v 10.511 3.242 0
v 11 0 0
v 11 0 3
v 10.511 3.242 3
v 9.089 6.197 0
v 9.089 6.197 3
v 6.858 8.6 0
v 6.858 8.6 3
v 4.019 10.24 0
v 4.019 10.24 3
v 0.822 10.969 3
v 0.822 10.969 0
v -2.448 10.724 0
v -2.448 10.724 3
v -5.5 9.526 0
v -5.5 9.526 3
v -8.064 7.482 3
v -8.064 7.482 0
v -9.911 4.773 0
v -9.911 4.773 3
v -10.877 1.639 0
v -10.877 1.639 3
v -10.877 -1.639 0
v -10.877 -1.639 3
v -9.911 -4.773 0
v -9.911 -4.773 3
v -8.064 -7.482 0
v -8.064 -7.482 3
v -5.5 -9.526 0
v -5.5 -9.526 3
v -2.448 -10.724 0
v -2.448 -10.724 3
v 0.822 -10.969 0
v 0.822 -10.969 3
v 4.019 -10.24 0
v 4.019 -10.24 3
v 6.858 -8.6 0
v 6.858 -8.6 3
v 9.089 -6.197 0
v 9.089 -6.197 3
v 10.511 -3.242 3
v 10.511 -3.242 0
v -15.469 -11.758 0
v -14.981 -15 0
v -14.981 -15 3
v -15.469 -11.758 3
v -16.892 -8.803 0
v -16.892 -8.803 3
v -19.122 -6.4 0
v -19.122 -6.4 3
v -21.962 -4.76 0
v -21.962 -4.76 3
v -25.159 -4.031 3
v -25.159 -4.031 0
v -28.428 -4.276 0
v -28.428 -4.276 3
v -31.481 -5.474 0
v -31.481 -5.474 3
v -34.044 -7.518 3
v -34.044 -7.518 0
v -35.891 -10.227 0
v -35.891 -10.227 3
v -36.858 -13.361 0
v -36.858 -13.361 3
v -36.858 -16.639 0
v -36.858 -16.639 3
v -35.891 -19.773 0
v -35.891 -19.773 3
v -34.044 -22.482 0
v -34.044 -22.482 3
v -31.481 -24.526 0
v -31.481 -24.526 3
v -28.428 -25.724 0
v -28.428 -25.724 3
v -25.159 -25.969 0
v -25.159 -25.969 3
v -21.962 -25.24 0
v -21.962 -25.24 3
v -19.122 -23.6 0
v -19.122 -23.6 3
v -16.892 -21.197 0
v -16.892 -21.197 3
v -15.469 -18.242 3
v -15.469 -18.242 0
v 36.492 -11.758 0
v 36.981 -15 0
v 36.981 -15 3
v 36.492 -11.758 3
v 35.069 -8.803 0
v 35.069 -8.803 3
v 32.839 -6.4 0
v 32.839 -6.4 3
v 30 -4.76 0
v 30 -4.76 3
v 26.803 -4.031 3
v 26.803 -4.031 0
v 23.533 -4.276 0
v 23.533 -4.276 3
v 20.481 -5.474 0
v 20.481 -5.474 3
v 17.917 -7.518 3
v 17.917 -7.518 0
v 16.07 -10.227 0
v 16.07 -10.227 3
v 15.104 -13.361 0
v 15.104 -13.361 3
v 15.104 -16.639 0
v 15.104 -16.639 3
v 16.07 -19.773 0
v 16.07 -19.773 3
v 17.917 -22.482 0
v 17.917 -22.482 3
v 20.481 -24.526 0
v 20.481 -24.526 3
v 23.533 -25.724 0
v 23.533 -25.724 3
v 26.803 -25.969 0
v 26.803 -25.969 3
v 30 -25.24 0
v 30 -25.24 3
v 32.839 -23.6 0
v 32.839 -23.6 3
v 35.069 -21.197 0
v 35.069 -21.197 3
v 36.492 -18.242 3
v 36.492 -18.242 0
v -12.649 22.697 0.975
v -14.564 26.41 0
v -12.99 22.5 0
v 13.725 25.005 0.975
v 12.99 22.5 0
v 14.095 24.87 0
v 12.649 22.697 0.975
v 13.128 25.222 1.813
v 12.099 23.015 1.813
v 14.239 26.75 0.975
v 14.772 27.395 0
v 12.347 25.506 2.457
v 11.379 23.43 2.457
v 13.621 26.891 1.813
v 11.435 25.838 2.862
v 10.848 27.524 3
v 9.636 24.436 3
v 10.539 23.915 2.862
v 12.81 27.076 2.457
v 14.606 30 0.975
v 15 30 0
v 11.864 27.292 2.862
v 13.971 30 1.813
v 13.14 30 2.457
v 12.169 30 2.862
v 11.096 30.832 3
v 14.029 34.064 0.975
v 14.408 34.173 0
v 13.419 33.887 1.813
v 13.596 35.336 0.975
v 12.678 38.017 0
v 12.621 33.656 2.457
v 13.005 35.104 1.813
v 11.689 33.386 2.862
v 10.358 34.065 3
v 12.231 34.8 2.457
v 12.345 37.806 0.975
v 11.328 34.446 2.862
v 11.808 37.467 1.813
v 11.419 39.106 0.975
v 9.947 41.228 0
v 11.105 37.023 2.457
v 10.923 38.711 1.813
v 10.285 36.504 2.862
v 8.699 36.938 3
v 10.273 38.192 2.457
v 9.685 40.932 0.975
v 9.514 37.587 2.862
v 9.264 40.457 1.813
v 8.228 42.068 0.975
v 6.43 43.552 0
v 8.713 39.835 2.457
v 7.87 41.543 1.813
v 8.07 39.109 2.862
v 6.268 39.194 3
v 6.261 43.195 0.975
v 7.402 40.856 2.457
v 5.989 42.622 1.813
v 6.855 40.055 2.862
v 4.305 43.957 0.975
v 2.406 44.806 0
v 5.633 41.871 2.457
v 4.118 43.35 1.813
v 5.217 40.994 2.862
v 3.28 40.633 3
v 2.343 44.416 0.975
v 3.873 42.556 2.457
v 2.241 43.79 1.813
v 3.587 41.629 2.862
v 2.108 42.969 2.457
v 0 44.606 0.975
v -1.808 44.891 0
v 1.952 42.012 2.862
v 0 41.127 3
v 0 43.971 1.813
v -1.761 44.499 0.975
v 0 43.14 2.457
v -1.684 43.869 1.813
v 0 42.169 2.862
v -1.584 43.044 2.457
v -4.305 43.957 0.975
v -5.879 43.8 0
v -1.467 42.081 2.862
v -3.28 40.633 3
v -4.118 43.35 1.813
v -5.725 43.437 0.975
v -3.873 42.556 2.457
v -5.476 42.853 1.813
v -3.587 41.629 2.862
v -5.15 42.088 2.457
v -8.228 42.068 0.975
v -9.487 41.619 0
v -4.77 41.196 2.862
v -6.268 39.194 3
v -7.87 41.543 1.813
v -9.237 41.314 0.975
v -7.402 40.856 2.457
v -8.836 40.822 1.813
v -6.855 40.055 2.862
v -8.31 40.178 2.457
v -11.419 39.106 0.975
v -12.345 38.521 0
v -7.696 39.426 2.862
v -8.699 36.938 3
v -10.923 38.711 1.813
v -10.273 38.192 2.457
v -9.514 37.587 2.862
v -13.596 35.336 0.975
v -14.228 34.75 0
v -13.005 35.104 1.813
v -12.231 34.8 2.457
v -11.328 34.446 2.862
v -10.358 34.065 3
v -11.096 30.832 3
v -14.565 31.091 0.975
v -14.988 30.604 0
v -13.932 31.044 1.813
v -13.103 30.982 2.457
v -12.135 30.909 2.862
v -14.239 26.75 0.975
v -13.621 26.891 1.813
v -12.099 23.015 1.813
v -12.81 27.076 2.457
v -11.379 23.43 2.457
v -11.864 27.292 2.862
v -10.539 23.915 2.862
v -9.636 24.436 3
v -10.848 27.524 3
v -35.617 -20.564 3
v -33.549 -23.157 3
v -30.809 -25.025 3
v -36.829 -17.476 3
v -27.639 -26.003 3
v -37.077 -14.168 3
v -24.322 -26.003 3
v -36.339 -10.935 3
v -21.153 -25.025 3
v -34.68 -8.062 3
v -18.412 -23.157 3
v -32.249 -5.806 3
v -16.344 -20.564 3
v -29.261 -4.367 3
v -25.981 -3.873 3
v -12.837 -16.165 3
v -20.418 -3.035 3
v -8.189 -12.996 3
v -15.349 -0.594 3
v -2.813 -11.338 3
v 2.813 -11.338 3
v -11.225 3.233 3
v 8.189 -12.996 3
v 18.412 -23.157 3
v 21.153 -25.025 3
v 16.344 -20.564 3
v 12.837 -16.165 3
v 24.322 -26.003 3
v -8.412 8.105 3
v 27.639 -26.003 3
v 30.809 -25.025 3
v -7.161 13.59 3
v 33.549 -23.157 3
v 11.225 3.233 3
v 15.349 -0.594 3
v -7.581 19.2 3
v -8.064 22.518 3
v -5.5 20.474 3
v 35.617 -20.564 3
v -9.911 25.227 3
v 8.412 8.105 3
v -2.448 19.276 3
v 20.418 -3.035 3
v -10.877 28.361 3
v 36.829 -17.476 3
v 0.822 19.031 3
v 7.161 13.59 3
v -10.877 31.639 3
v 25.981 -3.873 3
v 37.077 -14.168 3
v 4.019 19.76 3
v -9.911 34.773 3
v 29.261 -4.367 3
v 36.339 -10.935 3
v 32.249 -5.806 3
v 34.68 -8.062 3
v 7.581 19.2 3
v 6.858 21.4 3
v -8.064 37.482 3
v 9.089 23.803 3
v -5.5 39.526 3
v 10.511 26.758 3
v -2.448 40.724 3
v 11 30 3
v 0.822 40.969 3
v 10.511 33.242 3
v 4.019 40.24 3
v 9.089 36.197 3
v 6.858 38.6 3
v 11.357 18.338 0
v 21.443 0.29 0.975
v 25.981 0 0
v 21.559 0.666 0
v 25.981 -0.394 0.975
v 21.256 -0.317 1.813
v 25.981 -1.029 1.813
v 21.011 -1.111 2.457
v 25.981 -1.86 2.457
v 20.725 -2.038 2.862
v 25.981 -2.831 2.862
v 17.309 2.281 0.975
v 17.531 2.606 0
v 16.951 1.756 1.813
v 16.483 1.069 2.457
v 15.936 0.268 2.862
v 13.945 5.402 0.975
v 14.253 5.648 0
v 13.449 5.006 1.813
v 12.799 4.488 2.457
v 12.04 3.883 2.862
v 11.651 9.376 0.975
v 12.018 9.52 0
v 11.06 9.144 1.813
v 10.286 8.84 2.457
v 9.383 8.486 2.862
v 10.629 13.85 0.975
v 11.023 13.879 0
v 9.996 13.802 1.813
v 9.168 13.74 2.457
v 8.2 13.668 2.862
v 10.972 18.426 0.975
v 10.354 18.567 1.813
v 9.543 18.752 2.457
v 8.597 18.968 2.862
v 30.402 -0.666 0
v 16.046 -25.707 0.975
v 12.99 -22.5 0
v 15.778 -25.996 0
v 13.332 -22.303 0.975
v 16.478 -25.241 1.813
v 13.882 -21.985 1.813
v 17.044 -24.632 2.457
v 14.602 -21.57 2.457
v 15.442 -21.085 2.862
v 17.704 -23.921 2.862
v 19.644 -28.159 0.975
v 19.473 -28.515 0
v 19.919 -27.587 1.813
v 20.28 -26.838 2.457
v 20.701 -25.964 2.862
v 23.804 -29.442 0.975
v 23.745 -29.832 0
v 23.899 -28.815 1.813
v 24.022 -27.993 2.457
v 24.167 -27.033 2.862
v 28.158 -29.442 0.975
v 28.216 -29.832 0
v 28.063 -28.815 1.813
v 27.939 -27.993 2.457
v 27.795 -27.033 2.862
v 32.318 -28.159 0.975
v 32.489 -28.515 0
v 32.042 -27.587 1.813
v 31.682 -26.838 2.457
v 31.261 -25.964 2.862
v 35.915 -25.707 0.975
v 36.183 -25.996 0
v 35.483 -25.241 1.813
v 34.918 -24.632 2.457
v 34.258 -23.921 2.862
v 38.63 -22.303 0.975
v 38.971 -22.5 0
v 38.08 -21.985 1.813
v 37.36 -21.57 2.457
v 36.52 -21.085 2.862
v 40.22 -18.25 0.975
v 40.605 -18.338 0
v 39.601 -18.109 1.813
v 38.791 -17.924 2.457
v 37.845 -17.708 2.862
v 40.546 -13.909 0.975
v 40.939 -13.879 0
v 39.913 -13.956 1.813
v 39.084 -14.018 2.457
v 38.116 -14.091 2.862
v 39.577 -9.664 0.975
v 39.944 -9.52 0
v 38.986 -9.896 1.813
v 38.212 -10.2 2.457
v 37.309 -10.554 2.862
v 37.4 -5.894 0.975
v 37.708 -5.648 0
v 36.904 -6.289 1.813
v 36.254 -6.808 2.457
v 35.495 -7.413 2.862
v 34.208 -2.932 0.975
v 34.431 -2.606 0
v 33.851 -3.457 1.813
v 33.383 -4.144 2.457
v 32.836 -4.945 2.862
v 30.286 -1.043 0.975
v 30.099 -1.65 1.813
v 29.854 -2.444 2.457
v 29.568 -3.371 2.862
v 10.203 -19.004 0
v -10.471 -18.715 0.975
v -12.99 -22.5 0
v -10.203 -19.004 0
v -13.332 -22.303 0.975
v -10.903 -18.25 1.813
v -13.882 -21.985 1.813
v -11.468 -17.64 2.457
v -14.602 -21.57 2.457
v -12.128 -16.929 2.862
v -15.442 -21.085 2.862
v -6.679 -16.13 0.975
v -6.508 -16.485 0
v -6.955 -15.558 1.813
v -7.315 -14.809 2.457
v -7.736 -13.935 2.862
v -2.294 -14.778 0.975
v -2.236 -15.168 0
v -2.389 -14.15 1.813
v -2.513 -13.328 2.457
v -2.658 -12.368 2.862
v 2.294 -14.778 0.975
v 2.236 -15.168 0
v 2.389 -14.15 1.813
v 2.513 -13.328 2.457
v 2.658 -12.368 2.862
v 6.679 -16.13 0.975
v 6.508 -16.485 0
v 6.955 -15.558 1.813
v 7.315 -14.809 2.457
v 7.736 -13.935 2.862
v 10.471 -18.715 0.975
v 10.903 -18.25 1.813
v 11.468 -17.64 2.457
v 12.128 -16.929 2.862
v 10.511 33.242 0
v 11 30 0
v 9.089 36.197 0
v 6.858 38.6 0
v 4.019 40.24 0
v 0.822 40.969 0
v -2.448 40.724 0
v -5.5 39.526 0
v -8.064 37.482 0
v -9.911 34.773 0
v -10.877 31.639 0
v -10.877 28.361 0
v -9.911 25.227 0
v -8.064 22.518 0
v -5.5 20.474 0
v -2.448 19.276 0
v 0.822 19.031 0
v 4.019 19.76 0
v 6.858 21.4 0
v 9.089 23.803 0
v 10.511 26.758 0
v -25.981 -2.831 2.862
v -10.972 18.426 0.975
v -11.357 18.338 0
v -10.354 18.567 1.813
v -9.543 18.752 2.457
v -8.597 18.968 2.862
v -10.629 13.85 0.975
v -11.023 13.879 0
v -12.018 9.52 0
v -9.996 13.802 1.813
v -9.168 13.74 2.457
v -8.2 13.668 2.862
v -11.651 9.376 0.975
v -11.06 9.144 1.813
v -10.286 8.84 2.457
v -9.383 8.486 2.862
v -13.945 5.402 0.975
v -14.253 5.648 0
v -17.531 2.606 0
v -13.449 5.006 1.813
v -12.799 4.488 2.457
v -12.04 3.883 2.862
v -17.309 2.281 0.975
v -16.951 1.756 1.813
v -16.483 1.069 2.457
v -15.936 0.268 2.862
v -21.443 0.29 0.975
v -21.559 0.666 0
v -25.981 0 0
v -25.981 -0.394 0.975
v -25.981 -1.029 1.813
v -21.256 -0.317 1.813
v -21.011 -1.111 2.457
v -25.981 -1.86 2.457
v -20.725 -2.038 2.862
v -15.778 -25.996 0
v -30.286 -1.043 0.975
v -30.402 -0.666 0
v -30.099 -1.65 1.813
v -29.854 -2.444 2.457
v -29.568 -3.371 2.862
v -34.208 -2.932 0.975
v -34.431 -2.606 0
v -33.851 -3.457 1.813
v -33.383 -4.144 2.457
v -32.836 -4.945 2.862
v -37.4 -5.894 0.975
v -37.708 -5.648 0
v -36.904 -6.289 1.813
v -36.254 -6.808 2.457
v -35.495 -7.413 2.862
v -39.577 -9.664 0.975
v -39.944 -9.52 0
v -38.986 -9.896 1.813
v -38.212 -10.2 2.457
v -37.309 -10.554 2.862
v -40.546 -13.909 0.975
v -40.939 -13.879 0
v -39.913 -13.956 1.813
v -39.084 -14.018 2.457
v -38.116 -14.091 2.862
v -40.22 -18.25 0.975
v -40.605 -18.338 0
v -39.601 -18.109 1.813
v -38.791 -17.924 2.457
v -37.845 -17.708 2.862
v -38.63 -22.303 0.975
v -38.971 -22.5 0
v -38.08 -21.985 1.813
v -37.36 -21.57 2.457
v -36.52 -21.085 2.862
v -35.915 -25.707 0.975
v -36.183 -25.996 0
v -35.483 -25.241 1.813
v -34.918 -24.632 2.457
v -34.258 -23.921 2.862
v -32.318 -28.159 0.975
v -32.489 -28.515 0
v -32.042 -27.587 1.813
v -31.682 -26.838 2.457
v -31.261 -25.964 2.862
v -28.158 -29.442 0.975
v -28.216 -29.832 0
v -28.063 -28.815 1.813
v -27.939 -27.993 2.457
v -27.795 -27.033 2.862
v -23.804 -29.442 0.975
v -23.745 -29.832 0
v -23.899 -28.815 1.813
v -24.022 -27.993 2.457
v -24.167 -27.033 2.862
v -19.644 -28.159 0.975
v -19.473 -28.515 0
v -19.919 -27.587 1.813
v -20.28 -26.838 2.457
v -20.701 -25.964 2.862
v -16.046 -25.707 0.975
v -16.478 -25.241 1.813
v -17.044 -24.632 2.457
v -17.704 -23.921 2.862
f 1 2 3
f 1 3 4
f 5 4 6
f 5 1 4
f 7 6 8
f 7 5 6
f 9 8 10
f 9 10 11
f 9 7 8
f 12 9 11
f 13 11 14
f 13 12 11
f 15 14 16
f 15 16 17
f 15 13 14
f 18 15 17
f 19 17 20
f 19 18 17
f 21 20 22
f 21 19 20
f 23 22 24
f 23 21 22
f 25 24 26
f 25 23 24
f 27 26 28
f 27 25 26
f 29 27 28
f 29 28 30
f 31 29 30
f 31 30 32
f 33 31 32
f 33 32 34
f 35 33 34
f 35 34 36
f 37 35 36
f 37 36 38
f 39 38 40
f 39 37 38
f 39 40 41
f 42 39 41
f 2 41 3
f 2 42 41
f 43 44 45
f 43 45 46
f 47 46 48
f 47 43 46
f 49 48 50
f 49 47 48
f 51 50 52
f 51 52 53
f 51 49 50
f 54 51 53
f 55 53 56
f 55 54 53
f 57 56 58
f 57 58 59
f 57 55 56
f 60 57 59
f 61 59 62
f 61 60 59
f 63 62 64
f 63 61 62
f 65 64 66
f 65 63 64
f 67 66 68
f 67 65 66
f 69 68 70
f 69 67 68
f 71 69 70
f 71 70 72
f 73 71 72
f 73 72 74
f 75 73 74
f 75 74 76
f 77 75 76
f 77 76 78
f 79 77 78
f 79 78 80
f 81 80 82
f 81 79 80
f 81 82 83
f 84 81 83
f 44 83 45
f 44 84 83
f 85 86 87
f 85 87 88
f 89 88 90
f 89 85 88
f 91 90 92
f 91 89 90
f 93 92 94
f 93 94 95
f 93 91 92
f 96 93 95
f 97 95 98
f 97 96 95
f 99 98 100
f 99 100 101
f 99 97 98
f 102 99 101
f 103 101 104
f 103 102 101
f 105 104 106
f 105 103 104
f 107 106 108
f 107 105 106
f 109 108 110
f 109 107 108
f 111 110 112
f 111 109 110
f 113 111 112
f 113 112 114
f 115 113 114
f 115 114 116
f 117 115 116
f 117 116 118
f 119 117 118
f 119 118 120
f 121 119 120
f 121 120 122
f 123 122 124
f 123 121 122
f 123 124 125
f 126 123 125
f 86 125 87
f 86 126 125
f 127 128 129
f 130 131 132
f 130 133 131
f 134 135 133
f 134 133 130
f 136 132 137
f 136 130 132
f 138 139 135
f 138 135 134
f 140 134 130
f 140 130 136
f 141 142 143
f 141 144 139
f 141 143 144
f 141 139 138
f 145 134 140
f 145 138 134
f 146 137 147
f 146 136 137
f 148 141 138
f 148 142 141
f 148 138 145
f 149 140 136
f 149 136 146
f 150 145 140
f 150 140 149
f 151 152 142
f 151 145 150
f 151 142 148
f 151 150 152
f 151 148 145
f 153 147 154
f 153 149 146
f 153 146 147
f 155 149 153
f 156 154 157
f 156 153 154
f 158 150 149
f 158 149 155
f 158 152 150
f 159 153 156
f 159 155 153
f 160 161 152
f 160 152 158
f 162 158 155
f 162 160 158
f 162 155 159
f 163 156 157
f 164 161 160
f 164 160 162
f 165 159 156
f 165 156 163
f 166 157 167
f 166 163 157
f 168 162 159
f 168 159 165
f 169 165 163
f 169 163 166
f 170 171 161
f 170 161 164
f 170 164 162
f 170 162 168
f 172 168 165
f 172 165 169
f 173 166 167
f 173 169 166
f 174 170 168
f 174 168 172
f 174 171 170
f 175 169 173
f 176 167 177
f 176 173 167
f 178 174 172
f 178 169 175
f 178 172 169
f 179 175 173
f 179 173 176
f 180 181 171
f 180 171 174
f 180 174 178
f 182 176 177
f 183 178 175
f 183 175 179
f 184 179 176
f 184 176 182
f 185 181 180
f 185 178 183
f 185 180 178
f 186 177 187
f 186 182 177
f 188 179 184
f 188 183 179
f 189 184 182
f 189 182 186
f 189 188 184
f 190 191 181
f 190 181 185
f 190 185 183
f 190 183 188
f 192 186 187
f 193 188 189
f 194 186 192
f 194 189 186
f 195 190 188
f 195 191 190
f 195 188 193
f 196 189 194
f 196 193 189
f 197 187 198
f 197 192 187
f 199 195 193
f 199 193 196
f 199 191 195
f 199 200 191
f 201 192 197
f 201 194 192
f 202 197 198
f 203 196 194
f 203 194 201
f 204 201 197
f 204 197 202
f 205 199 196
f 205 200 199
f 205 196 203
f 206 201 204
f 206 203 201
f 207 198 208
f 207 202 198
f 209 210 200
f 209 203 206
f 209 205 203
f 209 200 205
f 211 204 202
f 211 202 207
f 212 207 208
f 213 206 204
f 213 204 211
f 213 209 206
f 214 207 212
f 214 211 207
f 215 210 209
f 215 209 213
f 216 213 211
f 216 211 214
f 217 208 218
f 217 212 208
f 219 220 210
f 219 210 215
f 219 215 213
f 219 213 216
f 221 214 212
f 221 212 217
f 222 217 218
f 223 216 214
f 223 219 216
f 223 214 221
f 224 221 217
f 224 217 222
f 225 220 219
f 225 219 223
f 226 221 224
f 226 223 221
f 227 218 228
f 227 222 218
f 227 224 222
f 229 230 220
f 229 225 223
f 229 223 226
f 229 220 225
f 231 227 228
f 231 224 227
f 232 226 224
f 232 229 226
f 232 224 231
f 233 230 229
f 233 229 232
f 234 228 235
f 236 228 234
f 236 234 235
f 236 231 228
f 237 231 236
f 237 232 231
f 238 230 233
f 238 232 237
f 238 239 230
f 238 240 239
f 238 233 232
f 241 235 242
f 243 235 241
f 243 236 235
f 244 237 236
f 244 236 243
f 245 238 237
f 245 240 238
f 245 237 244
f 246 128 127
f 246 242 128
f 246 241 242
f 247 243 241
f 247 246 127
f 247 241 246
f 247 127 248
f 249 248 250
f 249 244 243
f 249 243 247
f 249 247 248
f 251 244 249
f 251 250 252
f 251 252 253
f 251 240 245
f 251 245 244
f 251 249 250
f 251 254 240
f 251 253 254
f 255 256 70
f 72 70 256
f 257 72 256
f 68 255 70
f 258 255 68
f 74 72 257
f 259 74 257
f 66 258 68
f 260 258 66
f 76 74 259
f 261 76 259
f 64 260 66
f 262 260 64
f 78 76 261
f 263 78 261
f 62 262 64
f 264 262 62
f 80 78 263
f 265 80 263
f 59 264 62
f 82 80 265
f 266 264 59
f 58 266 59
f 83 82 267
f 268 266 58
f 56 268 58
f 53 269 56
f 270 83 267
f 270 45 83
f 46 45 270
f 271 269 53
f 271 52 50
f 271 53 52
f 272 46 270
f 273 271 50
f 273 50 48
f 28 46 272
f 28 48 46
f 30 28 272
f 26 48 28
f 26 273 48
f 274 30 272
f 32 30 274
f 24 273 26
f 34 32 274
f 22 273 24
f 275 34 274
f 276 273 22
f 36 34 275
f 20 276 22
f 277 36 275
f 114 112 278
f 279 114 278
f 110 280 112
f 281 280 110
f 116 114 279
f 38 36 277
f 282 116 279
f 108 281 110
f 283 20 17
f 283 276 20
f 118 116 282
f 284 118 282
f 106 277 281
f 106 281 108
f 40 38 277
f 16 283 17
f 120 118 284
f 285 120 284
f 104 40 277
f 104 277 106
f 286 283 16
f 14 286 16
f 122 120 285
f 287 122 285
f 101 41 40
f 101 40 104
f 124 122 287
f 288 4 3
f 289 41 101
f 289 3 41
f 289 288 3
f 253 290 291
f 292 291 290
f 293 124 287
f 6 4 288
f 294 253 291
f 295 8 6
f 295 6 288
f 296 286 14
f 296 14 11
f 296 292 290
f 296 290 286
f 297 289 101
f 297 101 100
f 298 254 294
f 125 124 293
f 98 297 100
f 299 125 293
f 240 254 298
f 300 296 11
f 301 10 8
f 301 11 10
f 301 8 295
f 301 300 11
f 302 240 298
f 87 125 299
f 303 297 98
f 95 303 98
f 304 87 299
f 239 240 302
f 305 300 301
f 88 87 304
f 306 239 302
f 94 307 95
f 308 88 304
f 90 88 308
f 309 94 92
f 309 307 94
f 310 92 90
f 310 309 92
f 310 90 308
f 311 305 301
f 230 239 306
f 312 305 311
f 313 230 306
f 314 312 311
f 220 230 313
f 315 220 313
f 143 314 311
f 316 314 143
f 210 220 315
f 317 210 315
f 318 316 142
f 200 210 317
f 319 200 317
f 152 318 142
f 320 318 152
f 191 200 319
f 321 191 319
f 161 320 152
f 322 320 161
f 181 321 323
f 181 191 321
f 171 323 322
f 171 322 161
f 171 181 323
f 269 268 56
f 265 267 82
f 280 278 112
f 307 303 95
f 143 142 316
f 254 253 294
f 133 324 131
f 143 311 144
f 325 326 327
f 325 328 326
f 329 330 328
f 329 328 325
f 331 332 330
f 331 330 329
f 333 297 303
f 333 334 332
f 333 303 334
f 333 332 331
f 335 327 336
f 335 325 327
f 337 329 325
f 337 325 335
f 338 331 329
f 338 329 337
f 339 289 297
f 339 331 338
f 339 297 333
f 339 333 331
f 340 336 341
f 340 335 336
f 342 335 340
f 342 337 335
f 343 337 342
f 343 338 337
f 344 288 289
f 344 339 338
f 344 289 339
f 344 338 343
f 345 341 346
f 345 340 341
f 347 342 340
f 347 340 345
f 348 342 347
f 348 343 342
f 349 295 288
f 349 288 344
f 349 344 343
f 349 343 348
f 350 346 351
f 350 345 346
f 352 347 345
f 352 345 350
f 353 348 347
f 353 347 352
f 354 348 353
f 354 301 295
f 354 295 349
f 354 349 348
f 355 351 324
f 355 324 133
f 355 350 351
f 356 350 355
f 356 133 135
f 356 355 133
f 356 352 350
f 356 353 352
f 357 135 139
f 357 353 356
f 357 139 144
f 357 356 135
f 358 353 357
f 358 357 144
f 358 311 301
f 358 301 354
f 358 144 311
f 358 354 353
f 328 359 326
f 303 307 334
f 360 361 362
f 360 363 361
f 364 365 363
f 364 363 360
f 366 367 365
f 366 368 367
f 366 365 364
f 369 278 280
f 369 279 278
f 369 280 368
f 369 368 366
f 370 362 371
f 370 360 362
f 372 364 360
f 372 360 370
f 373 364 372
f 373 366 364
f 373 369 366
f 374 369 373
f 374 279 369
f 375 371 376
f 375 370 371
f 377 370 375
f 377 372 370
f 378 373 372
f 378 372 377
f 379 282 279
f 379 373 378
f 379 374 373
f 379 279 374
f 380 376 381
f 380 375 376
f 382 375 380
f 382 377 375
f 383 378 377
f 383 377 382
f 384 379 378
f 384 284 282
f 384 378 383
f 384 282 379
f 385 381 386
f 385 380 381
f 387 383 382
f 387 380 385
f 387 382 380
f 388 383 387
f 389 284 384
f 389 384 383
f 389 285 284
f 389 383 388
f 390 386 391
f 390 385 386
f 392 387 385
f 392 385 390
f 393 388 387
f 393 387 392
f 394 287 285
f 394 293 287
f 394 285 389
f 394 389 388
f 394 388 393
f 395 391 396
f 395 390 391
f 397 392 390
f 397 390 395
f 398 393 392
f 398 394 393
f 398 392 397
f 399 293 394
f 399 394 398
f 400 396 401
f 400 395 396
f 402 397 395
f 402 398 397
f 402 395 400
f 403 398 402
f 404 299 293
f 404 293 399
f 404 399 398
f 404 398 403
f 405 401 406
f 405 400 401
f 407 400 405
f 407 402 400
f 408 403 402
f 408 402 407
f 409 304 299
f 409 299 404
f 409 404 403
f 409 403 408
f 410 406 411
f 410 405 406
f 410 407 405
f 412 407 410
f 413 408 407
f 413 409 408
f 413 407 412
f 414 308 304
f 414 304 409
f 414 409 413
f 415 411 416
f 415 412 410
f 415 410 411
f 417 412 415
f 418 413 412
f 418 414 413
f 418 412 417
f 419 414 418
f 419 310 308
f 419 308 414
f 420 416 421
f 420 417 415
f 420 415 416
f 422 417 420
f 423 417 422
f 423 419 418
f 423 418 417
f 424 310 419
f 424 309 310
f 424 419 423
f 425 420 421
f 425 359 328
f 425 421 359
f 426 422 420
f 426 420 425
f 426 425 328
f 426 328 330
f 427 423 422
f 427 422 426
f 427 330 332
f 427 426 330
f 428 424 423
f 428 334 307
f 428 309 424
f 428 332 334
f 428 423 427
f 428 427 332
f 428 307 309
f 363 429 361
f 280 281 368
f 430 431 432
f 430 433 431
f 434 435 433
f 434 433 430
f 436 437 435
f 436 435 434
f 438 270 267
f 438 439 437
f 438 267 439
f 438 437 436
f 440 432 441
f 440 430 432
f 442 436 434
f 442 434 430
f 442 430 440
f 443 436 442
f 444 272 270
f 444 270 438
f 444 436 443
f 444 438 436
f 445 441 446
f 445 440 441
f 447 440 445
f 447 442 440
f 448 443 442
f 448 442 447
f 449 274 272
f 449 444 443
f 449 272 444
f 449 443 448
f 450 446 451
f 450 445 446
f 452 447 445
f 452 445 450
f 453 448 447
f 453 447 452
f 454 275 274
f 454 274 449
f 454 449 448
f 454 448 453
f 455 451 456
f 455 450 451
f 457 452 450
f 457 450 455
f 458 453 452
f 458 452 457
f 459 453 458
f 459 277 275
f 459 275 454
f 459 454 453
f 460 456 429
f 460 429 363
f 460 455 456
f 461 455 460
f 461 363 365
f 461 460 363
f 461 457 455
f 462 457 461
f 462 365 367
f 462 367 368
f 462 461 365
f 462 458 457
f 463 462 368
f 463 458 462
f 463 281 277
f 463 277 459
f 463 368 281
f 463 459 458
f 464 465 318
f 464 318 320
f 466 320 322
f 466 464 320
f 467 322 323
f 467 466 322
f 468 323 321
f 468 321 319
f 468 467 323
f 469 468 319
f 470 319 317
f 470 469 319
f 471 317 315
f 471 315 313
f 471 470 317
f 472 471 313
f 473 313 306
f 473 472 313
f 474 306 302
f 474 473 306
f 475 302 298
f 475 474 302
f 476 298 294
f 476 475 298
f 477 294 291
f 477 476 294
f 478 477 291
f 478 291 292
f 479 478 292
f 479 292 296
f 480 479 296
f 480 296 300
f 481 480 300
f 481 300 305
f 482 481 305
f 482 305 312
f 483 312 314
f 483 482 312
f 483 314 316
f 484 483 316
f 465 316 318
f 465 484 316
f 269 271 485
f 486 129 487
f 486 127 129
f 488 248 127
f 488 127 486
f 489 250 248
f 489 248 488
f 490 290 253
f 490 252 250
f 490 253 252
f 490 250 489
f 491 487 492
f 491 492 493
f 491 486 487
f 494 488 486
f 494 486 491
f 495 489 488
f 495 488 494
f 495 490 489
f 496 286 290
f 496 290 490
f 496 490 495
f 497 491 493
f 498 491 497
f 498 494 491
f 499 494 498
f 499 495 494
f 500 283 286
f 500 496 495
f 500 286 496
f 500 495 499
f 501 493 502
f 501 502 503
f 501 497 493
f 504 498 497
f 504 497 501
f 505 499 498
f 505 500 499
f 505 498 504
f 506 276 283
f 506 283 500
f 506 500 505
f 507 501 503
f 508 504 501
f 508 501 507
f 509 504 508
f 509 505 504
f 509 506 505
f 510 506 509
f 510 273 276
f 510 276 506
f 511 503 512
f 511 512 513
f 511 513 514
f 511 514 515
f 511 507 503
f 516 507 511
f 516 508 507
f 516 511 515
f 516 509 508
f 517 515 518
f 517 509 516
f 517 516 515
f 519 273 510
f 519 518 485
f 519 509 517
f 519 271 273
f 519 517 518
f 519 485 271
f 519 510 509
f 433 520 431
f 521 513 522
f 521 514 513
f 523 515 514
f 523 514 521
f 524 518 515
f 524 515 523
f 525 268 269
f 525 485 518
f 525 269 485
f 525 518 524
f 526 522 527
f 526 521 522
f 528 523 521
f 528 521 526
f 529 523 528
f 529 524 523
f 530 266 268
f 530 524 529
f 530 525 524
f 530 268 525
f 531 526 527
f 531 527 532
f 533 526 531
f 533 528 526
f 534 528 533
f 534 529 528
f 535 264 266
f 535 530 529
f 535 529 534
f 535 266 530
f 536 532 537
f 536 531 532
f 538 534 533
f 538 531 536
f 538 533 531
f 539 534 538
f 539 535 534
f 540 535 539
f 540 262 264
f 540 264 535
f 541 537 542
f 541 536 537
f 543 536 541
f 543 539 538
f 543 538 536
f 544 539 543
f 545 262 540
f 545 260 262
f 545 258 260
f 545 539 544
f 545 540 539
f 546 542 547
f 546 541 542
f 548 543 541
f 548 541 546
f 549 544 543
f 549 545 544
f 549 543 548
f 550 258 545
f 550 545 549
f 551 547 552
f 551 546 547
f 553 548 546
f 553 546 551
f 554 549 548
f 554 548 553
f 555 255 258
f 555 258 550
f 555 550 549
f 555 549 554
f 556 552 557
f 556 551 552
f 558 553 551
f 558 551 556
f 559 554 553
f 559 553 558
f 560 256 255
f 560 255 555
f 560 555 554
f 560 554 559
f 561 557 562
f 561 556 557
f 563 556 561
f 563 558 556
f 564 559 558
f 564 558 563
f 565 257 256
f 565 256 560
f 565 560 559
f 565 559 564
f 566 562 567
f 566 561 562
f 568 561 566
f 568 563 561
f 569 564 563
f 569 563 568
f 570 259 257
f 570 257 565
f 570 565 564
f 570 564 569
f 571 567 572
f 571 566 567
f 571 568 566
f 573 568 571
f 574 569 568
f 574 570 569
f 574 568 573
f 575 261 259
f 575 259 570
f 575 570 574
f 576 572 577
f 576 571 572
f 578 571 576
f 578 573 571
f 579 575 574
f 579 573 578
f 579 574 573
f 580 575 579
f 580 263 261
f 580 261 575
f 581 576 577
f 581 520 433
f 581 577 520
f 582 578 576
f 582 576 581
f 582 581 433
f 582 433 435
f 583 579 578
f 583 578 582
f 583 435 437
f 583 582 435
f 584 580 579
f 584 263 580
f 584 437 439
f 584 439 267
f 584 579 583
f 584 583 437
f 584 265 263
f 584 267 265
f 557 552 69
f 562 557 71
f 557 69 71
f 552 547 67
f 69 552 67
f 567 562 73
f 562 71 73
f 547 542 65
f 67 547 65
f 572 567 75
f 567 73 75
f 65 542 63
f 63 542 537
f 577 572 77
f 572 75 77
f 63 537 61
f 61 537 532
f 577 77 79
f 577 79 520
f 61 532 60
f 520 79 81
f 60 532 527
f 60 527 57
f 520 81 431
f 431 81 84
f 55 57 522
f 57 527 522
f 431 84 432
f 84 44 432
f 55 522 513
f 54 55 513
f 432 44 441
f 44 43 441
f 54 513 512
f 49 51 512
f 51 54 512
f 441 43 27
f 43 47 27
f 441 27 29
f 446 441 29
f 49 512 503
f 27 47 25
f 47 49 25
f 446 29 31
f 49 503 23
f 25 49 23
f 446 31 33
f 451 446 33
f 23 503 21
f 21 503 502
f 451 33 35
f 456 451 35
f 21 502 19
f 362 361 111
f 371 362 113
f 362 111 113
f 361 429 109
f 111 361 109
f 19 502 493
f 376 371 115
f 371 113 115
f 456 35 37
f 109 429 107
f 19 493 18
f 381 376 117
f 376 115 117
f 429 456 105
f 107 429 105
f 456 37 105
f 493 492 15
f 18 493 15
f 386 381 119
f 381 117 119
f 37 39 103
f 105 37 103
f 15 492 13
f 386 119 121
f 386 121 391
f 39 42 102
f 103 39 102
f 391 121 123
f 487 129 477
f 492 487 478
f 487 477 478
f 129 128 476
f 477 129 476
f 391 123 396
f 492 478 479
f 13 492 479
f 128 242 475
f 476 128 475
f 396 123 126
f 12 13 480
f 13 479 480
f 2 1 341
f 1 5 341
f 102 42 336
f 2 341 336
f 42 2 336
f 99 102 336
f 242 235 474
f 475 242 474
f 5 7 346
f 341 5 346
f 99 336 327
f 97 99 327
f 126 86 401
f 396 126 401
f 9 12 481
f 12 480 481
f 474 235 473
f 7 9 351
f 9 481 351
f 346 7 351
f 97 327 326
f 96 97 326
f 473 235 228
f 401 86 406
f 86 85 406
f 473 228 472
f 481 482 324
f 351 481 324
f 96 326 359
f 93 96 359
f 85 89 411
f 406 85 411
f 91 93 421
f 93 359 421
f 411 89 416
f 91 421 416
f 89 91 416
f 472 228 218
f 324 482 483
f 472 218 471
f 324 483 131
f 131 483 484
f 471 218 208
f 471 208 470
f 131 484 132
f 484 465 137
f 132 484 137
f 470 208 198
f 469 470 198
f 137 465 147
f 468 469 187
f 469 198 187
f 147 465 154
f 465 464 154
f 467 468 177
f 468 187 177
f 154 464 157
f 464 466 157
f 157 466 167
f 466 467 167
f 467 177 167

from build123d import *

# Parameters (mm, degrees)
F0_R         = 11
F1_DEPTH     = 3
F2_T2_ANGLE  = 120
F2_T4_ANGLE  = 240
F2_T6_ANGLE  = 240
F2_T8_ANGLE  = 120
F2_T10_ANGLE = 240
F2_T12_ANGLE = 120


# Not quite as in the source:
# - a fillet or chamfer that OpenCascade refuses, or shapes differently, is made with other operations: its cross-section is extruded or revolved along the edge and cut away or added


with BuildPart() as f1:
    # F0 (on Top) → F1 (new body)
    with BuildSketch(Plane.XY):
        with BuildLine():
            ThreePointArc((12.9903810568, 22.5), (14.4888873943, 26.1177143235), (15, 30))
            ThreePointArc((15, 30), (-3.8822856765, 44.4888873943), (-12.9903810568, 22.5))
            ThreePointArc((-12.9903810568, 22.5), (0, 15), (12.9903810568, 22.5))
        make_face()
        with Locations((0, 30)):
            Circle(F0_R, mode=Mode.SUBTRACT)
        with BuildLine():
            ThreePointArc((12.9903810568, 22.5), (0, 15), (-12.9903810568, 22.5))
            ThreePointArc((-12.9903810568, 22.5), (-12.9903810568, 7.5), (-25.9807621135, 0))
            ThreePointArc((-25.9807621135, 0), (-15.3741603957, -4.3933982822), (-10.9807621135, -15))
            ThreePointArc((-10.9807621135, -15), (-11.4918747192, -18.8822856765), (-12.9903810568, -22.5))
            ThreePointArc((-12.9903810568, -22.5), (0, -15), (12.9903810568, -22.5))
            ThreePointArc((12.9903810568, -22.5), (12.9903810568, -7.5), (25.9807621135, 0))
            ThreePointArc((25.9807621135, 0), (12.9903810568, 7.5), (12.9903810568, 22.5))
        make_face()
        Circle(F0_R, mode=Mode.SUBTRACT)
        with BuildLine():
            ThreePointArc((-10.9807621135, -15), (-15.3741603957, -4.3933982822), (-25.9807621135, 0))
            ThreePointArc((-25.9807621135, 0), (-38.9711431703, -22.5), (-12.9903810568, -22.5))
            ThreePointArc((-12.9903810568, -22.5), (-11.4918747192, -18.8822856765), (-10.9807621135, -15))
        make_face()
        with Locations((-25.9807621135, -15)):
            Circle(F0_R, mode=Mode.SUBTRACT)
        with BuildLine():
            ThreePointArc((40.9807621135, -15), (36.5873638313, -4.3933982822), (25.9807621135, 0))
            ThreePointArc((25.9807621135, 0), (12.9903810568, -7.5), (12.9903810568, -22.5))
            ThreePointArc((12.9903810568, -22.5), (29.8630477901, -29.4888873943), (40.9807621135, -15))
        make_face()
        with Locations((25.9807621135, -15)):
            Circle(F0_R, mode=Mode.SUBTRACT)
    extrude(amount=F1_DEPTH)

    # F2: fillet of radius 4 on 1 edges, made by hand

    # F2_s1 → F2_t2 (revolve, cut)
    with BuildSketch(Plane(origin=(-12.9903810568, 22.5, 0), x_dir=(0, 0, 1), z_dir=(-0.5, 0.8660254038, 0))):
        with BuildLine():
            ThreePointArc((0, 0), (2.1622776602, 1.4234936034), (3, 3.8729833462))
            Line((3, 3.8729833462), (3, 0))
            Line((3, 0), (0, 0))
        make_face()
    revolve(axis=Axis((-25.9807621135, 15, 3), (0, 0, -1)), revolution_arc=F2_T2_ANGLE, mode=Mode.SUBTRACT)

    # F2_s3 → F2_t4 (revolve, cut)
    with BuildSketch(Plane(origin=(12.9903810568, 22.5, 0), x_dir=(0, 0, 1), z_dir=(-0.5, -0.8660254038, 0))):
        with BuildLine():
            ThreePointArc((0, 0), (2.1622776602, 1.4234936034), (3, 3.8729833462))
            Line((3, 3.8729833462), (3, 0))
            Line((3, 0), (0, 0))
        make_face()
    revolve(axis=Axis((0, 30, 3), (0, 0, 1)), revolution_arc=F2_T4_ANGLE, mode=Mode.SUBTRACT)

    # F2_s5 → F2_t6 (revolve, cut)
    with BuildSketch(Plane.YZ.offset(-25.9807621135)):
        with BuildLine():
            ThreePointArc((0, 0), (-1.4234936034, 2.1622776602), (-3.8729833462, 3))
            Line((-3.8729833462, 3), (0, 3))
            Line((0, 3), (0, 0))
        make_face()
    revolve(axis=Axis((-25.9807621135, -15, 3), (0, 0, 1)), revolution_arc=F2_T6_ANGLE, mode=Mode.SUBTRACT)

    # F2_s7 → F2_t8 (revolve, cut)
    with BuildSketch(Plane(origin=(-12.9903810568, -22.5, 0), x_dir=(0, 0, 1), z_dir=(-0.5, -0.8660254038, 0))):
        with BuildLine():
            ThreePointArc((0, 0), (2.1622776602, 1.4234936034), (3, 3.8729833462))
            Line((3, 3.8729833462), (3, 0))
            Line((3, 0), (0, 0))
        make_face()
    revolve(axis=Axis((0, -30, 3), (0, 0, -1)), revolution_arc=F2_T8_ANGLE, mode=Mode.SUBTRACT)

    # F2_s9 → F2_t10 (revolve, cut)
    with BuildSketch(Plane(origin=(12.9903810568, -22.5, 0), x_dir=(0, 0, 1), z_dir=(-0.5, 0.8660254038, 0))):
        with BuildLine():
            ThreePointArc((0, 0), (2.1622776602, 1.4234936034), (3, 3.8729833462))
            Line((3, 3.8729833462), (3, 0))
            Line((3, 0), (0, 0))
        make_face()
    revolve(axis=Axis((25.9807621135, -15, 3), (0, 0, 1)), revolution_arc=F2_T10_ANGLE, mode=Mode.SUBTRACT)

    # F2_s11 → F2_t12 (revolve, cut)
    with BuildSketch(Plane.YZ.offset(25.9807621135)):
        with BuildLine():
            ThreePointArc((0, 0), (-1.4234936034, 2.1622776602), (-3.8729833462, 3))
            Line((-3.8729833462, 3), (0, 3))
            Line((0, 3), (0, 0))
        make_face()
    revolve(axis=Axis((25.9807621135, 15, 3), (0, 0, -1)), revolution_arc=F2_T12_ANGLE, mode=Mode.SUBTRACT)


solid = f1.part
